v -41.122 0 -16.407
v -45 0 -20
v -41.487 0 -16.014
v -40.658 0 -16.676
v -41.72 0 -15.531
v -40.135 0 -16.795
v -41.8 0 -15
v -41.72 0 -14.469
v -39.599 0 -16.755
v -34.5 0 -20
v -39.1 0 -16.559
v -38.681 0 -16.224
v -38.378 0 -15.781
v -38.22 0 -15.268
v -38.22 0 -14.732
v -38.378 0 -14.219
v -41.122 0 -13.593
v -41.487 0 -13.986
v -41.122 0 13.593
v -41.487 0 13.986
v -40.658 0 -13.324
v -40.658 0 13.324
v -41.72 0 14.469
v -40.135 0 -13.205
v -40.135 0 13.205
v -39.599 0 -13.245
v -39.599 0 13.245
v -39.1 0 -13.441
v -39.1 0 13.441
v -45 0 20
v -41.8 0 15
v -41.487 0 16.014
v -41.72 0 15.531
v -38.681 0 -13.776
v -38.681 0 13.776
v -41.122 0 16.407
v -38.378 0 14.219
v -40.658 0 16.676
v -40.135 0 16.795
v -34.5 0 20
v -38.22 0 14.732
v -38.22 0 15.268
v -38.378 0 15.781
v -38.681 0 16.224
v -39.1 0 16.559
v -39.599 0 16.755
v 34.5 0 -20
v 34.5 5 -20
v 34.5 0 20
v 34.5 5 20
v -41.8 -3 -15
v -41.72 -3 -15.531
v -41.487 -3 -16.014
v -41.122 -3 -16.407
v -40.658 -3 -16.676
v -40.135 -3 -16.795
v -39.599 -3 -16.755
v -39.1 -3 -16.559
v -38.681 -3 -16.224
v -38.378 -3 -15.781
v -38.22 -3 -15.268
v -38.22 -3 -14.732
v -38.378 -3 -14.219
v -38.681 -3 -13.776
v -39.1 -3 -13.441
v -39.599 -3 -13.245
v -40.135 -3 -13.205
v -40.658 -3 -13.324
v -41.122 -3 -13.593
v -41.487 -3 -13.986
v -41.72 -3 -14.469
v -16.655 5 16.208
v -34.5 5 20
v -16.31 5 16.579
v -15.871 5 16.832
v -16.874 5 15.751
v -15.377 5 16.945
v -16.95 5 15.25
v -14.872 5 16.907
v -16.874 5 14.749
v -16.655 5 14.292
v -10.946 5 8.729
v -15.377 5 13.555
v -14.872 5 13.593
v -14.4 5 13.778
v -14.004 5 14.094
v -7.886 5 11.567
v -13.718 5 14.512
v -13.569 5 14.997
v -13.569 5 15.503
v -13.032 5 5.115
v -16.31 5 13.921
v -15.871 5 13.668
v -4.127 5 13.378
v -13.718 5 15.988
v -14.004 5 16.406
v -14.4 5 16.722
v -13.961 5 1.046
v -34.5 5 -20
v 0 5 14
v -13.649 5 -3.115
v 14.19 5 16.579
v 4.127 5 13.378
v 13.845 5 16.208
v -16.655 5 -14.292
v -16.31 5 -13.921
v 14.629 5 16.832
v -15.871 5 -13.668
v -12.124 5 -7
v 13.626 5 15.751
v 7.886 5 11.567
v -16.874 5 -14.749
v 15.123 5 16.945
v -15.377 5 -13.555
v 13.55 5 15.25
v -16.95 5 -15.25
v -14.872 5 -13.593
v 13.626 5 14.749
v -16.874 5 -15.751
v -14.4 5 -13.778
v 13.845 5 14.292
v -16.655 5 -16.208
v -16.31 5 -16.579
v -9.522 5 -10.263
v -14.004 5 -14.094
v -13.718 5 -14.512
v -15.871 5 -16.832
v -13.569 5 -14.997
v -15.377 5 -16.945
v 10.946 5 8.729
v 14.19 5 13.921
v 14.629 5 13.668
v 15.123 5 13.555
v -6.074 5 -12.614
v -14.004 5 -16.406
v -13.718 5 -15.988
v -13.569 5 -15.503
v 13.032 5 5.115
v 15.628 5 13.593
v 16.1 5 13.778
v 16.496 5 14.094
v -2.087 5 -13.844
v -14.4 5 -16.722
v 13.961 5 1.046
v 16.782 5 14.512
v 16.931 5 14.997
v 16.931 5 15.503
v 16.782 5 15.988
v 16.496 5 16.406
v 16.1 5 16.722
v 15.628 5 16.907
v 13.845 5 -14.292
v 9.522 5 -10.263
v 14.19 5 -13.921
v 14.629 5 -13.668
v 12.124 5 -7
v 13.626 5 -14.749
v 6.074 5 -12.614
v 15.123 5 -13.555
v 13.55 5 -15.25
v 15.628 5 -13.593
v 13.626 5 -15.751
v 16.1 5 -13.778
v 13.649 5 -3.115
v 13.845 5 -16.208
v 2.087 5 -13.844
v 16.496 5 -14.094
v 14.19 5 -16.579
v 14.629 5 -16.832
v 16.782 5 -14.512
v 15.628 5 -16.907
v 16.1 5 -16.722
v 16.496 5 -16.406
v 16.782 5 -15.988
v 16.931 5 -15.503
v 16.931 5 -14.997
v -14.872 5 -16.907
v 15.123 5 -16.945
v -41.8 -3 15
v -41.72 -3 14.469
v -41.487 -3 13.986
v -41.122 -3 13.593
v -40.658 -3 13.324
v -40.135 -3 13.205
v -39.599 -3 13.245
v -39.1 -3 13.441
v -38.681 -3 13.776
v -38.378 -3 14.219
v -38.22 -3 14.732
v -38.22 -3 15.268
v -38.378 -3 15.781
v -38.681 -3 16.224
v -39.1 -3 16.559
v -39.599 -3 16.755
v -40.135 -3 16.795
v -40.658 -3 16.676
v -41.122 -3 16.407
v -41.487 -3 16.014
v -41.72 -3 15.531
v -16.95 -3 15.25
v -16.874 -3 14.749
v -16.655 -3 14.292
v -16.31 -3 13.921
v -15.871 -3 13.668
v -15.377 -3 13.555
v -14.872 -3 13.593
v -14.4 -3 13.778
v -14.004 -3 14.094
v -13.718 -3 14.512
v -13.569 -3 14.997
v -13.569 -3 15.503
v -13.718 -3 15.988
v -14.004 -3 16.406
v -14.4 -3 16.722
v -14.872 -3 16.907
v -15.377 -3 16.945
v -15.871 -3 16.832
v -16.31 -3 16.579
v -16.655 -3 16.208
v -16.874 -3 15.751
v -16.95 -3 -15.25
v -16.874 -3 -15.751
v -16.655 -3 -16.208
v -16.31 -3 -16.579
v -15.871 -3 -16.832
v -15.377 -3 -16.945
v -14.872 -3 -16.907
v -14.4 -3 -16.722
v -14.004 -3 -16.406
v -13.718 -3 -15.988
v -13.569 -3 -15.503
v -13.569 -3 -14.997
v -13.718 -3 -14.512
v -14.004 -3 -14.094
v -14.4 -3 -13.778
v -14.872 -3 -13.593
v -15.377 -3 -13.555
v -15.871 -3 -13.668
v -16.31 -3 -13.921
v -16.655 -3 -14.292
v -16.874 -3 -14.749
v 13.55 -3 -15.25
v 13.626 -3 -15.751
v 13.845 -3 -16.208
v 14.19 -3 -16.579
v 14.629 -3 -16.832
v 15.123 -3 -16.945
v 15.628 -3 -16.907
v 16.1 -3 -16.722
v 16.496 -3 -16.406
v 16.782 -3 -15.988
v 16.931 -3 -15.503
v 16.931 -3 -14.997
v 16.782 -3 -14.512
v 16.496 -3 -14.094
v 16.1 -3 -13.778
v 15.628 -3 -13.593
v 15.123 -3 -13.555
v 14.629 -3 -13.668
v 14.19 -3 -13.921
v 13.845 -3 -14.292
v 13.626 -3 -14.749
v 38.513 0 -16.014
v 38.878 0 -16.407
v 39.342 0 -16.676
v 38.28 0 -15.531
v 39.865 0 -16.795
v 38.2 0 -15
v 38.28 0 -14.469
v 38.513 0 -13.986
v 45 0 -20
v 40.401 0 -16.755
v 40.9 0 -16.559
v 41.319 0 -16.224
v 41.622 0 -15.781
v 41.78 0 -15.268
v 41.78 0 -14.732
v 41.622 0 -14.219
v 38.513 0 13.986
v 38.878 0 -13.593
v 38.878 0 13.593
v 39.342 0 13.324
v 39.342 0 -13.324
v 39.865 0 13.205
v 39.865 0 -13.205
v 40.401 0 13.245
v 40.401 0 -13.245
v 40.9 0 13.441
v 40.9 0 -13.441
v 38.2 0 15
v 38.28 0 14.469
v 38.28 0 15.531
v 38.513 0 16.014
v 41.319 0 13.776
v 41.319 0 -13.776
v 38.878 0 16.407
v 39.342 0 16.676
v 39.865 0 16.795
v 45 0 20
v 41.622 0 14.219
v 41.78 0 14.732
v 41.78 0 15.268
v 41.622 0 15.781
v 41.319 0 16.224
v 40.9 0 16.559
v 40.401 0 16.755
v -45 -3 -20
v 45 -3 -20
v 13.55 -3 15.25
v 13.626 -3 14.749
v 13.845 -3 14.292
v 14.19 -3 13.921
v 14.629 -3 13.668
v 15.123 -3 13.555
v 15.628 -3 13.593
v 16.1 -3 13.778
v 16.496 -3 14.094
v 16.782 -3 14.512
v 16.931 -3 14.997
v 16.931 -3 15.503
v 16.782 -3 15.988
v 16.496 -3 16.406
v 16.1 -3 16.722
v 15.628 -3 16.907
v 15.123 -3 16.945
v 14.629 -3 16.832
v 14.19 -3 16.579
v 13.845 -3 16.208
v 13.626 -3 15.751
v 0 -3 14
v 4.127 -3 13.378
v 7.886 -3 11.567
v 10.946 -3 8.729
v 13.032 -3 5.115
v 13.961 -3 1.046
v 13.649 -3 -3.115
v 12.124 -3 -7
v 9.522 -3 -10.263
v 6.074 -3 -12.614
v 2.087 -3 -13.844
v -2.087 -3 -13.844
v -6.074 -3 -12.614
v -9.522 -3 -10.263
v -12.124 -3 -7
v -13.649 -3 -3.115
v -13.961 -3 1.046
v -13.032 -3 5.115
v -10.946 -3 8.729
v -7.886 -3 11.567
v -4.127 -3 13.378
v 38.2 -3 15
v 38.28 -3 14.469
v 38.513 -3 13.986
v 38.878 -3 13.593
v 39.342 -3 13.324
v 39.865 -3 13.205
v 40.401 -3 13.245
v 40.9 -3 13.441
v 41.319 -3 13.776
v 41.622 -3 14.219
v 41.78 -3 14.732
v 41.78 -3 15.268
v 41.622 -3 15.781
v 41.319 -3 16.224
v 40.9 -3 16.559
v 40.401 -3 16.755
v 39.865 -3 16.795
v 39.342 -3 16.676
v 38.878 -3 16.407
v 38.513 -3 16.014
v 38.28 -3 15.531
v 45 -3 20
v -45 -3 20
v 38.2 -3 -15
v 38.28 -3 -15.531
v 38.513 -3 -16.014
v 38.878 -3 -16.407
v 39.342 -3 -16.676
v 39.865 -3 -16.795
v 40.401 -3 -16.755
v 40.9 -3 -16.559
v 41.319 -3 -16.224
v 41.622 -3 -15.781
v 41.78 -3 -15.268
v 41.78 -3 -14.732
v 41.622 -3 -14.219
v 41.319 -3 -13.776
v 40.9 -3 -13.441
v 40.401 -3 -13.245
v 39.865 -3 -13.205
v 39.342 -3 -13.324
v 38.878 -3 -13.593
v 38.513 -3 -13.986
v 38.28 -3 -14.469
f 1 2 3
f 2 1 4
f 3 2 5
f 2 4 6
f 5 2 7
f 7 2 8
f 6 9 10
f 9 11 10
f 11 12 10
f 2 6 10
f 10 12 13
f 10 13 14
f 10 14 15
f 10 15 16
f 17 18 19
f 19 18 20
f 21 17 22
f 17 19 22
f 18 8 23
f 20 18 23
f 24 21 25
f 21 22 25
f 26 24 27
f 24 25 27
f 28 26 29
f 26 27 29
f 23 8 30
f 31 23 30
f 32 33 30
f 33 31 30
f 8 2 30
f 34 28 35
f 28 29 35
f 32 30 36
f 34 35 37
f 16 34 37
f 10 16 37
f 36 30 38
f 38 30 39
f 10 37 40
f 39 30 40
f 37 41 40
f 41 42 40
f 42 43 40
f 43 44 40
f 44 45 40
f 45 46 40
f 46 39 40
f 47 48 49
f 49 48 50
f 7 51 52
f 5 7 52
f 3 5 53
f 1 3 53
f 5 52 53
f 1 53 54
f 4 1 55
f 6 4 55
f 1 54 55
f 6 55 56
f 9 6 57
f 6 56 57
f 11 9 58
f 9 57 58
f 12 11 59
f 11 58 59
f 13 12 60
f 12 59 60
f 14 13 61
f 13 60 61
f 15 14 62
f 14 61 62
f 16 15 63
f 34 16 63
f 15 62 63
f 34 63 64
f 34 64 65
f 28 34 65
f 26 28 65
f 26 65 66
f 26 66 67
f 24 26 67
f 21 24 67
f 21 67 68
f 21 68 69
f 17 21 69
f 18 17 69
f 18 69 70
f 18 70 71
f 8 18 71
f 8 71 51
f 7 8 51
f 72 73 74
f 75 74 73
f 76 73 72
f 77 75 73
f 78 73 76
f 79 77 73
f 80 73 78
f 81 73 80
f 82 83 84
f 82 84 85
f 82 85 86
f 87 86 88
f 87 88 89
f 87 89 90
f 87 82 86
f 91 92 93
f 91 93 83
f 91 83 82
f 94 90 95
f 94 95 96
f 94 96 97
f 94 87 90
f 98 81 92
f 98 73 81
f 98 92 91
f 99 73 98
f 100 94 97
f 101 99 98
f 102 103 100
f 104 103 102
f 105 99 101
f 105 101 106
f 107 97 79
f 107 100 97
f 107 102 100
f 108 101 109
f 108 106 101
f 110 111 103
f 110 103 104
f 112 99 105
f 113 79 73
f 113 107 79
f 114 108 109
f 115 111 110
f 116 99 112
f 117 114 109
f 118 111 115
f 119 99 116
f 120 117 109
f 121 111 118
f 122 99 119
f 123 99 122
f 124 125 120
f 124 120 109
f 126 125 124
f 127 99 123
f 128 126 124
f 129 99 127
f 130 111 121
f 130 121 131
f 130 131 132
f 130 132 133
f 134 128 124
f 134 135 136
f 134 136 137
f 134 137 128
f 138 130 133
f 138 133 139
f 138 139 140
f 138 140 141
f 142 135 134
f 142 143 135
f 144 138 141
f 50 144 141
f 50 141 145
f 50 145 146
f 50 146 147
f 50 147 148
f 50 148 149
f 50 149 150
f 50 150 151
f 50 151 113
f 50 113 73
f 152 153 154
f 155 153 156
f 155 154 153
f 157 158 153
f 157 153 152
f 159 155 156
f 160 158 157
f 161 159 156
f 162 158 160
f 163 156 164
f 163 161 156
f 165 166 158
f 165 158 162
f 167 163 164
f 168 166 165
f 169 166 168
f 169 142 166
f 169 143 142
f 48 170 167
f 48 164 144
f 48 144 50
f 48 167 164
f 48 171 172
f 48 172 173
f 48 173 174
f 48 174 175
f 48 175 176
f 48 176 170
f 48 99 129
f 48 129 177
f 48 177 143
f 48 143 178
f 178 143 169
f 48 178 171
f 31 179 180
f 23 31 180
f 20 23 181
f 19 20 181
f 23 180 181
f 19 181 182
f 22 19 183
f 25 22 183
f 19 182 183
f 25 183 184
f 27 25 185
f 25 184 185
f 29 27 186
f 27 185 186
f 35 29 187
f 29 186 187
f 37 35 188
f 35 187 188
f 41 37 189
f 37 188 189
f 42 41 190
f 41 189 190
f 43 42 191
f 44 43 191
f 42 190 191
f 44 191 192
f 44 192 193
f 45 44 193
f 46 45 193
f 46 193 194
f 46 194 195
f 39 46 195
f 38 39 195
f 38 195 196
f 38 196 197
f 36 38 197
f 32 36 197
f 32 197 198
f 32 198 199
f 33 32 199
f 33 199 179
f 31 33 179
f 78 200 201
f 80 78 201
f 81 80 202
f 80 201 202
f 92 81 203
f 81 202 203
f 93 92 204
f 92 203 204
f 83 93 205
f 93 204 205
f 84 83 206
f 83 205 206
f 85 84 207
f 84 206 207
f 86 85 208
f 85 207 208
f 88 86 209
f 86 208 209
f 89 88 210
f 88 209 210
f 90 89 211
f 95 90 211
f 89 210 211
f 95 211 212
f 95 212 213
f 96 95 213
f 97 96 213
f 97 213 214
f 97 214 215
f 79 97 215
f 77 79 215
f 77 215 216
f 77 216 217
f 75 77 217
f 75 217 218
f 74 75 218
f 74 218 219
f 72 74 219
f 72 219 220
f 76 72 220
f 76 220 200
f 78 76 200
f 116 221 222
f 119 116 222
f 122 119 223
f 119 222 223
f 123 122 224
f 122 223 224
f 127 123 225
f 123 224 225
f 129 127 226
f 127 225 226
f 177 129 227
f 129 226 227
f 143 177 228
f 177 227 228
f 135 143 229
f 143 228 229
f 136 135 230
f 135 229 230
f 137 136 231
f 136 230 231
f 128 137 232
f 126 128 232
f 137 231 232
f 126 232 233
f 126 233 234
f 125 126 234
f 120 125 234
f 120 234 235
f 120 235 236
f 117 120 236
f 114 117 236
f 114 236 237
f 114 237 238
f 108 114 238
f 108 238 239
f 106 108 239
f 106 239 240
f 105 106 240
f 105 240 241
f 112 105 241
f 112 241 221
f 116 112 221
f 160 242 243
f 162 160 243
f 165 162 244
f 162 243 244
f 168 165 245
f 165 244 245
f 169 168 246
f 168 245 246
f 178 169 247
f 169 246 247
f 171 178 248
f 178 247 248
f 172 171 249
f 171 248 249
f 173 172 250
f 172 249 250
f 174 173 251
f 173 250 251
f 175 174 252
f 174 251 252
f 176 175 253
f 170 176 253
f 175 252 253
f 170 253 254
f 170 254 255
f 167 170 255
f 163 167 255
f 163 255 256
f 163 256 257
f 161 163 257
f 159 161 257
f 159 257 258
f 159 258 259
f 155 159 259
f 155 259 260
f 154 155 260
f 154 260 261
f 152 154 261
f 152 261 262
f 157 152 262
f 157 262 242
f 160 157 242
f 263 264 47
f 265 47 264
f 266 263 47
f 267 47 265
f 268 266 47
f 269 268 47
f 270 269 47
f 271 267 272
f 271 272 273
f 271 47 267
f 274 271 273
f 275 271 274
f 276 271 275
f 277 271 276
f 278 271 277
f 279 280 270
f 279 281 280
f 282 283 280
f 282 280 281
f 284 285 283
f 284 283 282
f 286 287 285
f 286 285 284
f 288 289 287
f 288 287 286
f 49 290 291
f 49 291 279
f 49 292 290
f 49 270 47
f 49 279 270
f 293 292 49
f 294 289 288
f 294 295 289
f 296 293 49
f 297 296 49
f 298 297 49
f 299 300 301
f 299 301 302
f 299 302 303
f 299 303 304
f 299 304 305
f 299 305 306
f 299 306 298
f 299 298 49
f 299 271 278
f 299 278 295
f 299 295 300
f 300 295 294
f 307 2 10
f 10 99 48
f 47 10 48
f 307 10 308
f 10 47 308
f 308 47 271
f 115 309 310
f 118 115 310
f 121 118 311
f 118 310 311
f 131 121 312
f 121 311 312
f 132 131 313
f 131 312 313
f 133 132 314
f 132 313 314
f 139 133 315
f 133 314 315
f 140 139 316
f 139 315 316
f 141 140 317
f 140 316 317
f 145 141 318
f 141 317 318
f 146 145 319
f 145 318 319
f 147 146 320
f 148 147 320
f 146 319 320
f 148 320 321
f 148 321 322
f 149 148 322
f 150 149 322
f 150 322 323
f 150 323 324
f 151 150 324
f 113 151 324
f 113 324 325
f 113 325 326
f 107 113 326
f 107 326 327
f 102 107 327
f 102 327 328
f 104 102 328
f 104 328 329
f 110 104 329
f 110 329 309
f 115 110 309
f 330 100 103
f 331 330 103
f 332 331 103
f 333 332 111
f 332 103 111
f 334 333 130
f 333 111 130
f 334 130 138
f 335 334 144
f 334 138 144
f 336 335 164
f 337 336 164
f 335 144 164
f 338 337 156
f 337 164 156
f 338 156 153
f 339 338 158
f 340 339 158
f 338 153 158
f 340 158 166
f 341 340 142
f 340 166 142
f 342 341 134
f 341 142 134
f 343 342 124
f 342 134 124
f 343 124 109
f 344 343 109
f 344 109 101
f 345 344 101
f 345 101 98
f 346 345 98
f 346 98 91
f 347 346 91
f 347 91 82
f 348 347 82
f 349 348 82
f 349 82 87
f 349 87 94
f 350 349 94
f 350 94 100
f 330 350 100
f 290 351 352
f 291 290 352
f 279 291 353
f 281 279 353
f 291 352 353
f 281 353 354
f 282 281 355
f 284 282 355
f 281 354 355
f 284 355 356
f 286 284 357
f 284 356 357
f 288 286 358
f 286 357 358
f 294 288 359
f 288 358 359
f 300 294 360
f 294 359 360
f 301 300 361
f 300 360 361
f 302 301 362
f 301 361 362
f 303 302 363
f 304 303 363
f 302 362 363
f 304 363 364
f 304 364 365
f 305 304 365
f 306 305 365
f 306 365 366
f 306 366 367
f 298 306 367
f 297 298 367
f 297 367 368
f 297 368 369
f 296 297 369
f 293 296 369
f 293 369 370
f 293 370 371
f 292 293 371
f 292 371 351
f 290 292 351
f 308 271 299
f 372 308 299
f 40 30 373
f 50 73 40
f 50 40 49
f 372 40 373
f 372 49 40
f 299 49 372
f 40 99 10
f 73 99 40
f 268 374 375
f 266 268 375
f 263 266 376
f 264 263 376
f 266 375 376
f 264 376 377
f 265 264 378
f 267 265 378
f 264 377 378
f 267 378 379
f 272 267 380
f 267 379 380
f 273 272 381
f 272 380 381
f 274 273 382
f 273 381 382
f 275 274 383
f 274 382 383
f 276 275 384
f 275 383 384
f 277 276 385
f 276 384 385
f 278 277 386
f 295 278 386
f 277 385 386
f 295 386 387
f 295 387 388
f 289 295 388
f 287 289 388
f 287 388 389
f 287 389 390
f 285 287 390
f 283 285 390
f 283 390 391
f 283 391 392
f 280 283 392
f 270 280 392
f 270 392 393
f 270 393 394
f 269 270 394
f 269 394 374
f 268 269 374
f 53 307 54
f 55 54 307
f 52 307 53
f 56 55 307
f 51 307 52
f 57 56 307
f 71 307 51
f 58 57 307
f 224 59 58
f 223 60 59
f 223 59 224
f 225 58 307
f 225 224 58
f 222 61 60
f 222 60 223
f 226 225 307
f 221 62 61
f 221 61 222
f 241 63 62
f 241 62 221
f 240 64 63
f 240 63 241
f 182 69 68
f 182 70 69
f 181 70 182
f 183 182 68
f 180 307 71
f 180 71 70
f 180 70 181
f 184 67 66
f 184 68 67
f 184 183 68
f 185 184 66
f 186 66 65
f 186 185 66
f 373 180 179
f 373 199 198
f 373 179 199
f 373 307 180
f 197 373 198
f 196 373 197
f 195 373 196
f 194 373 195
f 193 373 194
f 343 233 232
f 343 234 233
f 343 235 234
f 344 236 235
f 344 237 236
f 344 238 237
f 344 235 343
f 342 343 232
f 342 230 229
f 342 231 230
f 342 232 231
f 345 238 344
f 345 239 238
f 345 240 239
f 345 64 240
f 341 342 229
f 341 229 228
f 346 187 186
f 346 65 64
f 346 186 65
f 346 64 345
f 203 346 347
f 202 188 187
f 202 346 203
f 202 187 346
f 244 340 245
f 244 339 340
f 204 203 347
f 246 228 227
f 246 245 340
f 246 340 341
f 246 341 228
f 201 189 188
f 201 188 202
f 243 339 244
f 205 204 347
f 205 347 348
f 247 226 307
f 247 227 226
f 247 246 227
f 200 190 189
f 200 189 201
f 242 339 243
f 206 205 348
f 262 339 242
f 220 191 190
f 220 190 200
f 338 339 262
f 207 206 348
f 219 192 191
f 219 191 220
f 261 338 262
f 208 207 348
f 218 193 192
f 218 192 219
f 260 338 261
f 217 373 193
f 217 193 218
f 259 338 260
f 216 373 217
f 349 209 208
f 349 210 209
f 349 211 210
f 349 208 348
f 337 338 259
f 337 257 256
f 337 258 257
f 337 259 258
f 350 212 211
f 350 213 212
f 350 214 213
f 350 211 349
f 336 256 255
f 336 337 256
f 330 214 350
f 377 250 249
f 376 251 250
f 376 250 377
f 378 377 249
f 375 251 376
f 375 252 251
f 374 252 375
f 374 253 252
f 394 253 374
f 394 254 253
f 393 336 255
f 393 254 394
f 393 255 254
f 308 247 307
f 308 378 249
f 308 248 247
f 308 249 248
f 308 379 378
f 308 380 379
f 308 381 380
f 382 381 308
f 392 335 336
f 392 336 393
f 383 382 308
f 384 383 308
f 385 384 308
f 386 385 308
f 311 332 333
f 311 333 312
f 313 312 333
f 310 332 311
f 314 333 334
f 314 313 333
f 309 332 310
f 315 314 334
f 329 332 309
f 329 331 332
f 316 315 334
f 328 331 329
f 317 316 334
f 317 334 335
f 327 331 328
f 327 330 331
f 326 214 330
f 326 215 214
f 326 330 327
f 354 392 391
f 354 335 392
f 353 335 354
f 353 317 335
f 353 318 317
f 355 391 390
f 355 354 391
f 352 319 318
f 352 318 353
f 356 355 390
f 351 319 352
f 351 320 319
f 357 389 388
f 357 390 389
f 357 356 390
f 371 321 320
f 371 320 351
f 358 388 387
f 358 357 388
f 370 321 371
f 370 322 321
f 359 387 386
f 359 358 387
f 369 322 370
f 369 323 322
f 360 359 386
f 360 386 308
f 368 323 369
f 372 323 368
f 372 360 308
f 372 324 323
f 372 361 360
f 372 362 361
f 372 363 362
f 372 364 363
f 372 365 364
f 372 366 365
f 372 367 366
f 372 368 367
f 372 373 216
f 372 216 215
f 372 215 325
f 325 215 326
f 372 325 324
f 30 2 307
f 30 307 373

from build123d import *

# Parameters (mm, degrees)
SKETCH1_W            = 70
SKETCH1_H            = 40
BOSS_EXTRUDE1_DEPTH  = 5
SKETCH2_W            = 90
SKETCH2_H            = 40
BOSS_EXTRUDE2_DEPTH  = 3
M3_CLEARANCE_HOLE1_D = 3.6
M3_CLEARANCE_HOLE2_D = 3.4
SKETCH9_R            = 14
CUT_EXTRUDE1_DEPTH   = 50.889878733
SKETCH10_W           = 40
SKETCH10_H           = 5
CUT_EXTRUDE2_DEPTH   = 0.5


with BuildPart() as part:
    # Sketch1 → Boss-Extrude1 (new body)
    with BuildSketch(Plane(origin=(0, 0, 0), x_dir=(1, 0, 0), z_dir=(0, 1, 0))):
        Rectangle(SKETCH1_W, SKETCH1_H)
    extrude(amount=BOSS_EXTRUDE1_DEPTH)

    # Sketch2 → Boss-Extrude2 (add)
    with BuildSketch(Plane.XZ):
        Rectangle(SKETCH2_W, SKETCH2_H)
    extrude(amount=BOSS_EXTRUDE2_DEPTH)

    # M3 Clearance Hole1 (through all)
    with Locations(Plane(origin=(0, 0, 0), x_dir=(1, 0, 0), z_dir=(0, 1, 0))):
        with Locations((-40, 15), (-40, -15), (40, 15), (40, -15)):
            Hole(M3_CLEARANCE_HOLE1_D / 2)

    # M3 Clearance Hole2 (through all)
    with Locations(Plane(origin=(0, 5, 0), x_dir=(1, 0, 0), z_dir=(0, 1, 0))):
        with Locations((0, 0), (15.25, 15.25), (-15.25, -15.25), (-15.25, 15.25), (15.25, -15.25)):
            Hole(M3_CLEARANCE_HOLE2_D / 2)

    # Sketch9 → Cut-Extrude1 (cut, through all)
    with BuildSketch(Plane(origin=(0, 5, 0), x_dir=(1, 0, 0), z_dir=(0, 1, 0))):
        with Locations(Location((0, 0, 0), (0, 0, 270))):
            Circle(SKETCH9_R)
    extrude(amount=-CUT_EXTRUDE1_DEPTH, mode=Mode.SUBTRACT)

    # Sketch10 → Cut-Extrude2 (cut)
    with BuildSketch(Plane.ZY.offset(35)):
        with Locations((0, 2.5)):
            Rectangle(SKETCH10_W, SKETCH10_H)
    cut_extrude2 = extrude(amount=-CUT_EXTRUDE2_DEPTH, mode=Mode.SUBTRACT)

    # Mirror1: Cut-Extrude2 across plane
    add(cut_extrude2.mirror(Plane(origin=(0, 0, 0), x_dir=(0, 0, 1), z_dir=(1, 0, 0))), mode=Mode.SUBTRACT)


solid = part.part
